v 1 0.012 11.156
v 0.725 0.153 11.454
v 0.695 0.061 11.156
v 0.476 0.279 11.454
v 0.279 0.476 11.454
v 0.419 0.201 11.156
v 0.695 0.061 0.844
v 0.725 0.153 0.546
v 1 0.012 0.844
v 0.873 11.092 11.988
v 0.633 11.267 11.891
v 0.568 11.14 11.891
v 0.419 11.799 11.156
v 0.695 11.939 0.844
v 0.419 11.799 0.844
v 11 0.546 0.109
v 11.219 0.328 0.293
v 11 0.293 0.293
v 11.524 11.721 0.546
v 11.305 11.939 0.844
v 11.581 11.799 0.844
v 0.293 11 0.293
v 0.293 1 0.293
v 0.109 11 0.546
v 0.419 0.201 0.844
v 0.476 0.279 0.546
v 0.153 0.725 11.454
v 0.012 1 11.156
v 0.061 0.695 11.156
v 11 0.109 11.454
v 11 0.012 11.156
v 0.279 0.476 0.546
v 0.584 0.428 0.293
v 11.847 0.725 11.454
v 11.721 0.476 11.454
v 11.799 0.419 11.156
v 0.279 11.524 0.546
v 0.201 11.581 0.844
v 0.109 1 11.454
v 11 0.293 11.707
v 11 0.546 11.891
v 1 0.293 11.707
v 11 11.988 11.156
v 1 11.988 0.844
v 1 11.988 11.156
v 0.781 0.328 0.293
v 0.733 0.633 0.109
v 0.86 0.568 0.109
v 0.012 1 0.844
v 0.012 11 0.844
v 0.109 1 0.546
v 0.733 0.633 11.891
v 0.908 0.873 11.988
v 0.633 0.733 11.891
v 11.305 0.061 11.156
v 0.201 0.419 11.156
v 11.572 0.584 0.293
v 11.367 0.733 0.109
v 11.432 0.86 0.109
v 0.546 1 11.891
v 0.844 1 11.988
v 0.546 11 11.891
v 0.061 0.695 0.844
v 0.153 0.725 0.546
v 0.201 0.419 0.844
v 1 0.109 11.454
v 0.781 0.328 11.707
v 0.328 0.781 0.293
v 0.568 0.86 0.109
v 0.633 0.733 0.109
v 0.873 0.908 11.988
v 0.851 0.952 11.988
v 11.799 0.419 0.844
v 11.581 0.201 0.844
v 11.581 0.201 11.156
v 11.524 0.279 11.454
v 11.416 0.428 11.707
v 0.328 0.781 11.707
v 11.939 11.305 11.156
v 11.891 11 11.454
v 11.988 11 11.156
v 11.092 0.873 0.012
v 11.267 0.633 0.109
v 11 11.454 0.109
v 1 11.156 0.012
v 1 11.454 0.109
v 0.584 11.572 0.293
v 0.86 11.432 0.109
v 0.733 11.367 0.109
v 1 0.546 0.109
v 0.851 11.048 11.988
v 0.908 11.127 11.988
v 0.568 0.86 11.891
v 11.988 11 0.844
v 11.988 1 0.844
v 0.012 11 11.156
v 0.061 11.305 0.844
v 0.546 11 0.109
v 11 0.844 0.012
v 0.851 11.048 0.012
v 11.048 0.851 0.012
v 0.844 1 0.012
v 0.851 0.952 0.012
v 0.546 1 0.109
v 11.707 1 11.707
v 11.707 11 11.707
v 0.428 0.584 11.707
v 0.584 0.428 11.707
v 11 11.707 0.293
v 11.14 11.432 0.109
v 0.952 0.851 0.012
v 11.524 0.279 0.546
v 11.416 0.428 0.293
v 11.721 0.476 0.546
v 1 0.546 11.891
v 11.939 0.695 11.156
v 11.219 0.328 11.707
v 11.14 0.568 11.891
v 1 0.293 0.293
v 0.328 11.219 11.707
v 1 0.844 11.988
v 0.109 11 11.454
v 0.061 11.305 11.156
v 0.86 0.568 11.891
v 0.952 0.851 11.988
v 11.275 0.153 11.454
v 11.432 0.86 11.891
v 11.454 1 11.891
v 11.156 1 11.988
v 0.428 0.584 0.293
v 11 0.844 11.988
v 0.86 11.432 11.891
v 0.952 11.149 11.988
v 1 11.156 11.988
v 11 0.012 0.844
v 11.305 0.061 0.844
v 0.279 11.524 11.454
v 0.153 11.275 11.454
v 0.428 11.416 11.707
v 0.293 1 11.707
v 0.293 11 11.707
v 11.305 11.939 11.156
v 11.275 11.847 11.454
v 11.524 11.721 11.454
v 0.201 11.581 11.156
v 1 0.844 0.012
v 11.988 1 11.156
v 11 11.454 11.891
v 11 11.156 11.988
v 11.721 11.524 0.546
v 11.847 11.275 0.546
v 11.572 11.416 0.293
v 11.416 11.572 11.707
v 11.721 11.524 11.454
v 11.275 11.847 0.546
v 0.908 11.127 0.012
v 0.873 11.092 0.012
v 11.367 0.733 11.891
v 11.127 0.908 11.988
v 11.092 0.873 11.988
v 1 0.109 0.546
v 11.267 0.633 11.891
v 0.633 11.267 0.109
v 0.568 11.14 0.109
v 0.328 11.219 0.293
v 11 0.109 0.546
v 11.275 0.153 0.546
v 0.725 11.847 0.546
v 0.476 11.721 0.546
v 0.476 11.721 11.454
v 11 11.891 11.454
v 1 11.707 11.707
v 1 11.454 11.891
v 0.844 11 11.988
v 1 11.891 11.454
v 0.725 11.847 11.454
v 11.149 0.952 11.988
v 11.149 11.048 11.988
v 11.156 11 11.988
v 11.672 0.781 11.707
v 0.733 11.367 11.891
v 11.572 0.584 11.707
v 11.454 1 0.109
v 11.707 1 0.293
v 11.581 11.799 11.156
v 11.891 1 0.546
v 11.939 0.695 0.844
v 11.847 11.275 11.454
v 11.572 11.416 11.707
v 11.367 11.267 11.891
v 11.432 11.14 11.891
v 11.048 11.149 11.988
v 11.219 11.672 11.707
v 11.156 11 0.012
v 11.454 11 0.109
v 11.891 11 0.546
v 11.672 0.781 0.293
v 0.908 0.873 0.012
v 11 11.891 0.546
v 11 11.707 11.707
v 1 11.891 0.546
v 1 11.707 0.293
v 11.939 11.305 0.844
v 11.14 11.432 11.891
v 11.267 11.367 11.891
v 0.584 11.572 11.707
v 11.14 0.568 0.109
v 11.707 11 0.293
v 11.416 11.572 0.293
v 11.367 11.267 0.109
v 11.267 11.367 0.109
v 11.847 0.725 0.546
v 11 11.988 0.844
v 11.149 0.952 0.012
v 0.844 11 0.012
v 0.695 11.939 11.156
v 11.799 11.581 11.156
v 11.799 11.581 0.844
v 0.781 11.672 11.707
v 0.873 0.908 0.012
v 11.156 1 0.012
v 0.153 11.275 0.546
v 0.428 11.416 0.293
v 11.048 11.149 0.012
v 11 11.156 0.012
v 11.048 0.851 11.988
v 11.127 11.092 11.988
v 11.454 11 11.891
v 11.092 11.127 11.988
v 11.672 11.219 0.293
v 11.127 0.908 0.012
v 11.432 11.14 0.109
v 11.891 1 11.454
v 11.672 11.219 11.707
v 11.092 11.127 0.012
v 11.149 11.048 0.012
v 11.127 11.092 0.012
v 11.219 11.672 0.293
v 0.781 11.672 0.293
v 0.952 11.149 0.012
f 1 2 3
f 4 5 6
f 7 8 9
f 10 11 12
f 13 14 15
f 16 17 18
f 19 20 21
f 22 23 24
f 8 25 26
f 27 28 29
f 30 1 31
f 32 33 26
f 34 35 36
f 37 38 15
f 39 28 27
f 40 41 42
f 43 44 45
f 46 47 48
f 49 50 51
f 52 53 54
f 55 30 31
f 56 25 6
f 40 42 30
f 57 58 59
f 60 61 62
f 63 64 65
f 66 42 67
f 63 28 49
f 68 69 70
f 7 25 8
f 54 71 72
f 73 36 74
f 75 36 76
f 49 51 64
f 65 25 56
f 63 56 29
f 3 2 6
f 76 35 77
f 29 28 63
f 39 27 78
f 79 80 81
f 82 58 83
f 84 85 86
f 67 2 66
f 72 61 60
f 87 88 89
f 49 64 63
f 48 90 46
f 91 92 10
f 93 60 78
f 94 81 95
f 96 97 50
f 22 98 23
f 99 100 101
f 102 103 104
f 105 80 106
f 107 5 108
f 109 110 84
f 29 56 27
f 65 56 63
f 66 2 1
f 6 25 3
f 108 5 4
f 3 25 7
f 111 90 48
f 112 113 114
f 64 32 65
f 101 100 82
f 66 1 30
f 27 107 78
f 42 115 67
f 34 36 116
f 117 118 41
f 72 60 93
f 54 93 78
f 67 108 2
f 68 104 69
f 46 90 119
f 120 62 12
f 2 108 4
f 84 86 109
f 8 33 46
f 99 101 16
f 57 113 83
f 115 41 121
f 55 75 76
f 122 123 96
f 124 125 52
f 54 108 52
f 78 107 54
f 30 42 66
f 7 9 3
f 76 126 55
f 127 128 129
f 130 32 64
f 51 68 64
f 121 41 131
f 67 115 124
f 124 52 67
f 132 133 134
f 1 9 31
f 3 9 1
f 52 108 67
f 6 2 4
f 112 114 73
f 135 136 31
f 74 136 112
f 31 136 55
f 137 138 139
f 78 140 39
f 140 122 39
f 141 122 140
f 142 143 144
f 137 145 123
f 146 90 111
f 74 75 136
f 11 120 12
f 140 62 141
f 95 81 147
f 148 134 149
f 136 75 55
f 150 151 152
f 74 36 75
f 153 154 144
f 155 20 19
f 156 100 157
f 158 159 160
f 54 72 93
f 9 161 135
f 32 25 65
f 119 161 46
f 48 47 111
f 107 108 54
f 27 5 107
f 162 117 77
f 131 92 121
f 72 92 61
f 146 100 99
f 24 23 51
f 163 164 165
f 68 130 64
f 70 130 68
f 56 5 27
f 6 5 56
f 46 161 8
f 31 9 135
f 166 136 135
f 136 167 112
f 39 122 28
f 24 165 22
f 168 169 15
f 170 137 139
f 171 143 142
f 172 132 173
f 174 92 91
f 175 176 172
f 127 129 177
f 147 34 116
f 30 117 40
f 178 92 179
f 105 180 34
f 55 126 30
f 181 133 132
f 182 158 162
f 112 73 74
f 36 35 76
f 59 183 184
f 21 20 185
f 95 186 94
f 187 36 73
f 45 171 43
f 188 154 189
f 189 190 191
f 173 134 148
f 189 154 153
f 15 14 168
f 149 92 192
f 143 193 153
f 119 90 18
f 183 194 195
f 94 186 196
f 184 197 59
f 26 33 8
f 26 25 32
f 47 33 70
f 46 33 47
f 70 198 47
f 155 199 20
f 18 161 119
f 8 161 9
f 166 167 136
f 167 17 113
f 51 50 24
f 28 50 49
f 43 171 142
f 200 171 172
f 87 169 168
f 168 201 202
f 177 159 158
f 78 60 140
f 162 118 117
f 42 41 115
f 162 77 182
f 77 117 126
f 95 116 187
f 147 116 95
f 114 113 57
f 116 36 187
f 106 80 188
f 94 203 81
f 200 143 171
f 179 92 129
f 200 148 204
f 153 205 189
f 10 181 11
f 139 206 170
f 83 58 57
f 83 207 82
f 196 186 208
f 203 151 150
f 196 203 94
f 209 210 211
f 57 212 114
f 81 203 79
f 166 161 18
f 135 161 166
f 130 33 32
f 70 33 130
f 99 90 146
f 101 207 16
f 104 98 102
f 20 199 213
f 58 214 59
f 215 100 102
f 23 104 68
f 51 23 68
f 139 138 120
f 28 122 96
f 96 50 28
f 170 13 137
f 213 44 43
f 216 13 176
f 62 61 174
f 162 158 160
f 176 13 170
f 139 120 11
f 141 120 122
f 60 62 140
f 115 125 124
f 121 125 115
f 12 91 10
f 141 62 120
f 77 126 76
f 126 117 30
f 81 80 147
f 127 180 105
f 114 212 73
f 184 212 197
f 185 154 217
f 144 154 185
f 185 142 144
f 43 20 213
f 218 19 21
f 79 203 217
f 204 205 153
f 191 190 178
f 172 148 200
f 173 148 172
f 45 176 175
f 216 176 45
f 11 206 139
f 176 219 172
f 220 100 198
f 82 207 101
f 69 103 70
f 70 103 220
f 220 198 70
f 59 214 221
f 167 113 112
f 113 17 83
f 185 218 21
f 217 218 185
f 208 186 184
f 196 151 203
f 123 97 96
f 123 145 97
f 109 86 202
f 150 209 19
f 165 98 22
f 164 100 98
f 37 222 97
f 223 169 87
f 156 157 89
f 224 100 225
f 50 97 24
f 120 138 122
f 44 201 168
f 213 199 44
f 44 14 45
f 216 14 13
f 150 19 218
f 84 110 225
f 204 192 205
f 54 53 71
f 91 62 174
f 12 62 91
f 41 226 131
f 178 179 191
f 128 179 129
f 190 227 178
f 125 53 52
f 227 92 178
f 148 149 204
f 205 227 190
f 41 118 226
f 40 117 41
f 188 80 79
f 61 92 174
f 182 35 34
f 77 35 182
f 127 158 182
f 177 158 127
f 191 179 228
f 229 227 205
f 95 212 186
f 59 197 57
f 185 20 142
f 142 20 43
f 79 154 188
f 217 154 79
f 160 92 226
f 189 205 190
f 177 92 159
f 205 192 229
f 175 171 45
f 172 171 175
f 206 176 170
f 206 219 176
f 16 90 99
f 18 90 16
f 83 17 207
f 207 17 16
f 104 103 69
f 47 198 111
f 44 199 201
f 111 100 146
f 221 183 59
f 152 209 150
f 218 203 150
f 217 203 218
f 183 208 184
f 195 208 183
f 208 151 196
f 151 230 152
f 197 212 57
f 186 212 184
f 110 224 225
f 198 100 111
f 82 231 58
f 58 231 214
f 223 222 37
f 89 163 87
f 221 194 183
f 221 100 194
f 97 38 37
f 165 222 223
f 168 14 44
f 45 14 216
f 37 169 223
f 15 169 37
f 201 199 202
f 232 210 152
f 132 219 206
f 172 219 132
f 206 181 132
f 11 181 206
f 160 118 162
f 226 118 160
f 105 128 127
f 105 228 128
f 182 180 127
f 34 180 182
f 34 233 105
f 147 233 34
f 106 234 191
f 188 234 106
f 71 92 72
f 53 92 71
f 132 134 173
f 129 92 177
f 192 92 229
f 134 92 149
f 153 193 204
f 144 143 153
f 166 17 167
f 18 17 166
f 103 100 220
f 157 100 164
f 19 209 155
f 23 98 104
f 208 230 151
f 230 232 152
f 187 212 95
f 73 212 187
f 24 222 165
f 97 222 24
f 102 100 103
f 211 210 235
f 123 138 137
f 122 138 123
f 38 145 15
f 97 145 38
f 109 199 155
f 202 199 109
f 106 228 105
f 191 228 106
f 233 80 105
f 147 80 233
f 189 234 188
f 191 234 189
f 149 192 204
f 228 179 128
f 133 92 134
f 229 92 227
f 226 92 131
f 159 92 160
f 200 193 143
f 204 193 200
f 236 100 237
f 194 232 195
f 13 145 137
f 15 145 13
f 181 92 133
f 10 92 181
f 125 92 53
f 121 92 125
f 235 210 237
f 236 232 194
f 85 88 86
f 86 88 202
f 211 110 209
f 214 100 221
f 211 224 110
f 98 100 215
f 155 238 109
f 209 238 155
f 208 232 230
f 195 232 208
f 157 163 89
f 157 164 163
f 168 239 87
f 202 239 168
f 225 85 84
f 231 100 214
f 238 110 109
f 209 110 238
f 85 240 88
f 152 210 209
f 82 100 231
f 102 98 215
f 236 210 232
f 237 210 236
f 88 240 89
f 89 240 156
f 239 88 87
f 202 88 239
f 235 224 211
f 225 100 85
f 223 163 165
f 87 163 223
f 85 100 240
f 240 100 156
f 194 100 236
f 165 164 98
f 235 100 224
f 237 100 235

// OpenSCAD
module radiusedblock(xlen,ylen,zlen,radius)
{
    hull()
    {
    translate([radius,radius,radius]) sphere(r=radius, $fn=20);
    translate([xlen + radius , radius , radius]) sphere(r=radius, $fn=20);
    translate([radius , ylen + radius , radius]) sphere(r=radius, $fn=20);    
    translate([xlen + radius , ylen + radius , radius]) sphere(r=radius, $fn=20);
    translate([radius , radius , zlen + radius]) sphere(r=radius, $fn=20);
    translate([xlen + radius , radius , zlen + radius]) sphere(r=radius, $fn=20);
    translate([radius,ylen + radius,zlen + radius]) sphere(r=radius, $fn=20);
    translate([xlen + radius,ylen + radius,zlen + radius]) sphere(r=radius, $fn=20);
    }
}

radiusedblock(10,10,10,1);
